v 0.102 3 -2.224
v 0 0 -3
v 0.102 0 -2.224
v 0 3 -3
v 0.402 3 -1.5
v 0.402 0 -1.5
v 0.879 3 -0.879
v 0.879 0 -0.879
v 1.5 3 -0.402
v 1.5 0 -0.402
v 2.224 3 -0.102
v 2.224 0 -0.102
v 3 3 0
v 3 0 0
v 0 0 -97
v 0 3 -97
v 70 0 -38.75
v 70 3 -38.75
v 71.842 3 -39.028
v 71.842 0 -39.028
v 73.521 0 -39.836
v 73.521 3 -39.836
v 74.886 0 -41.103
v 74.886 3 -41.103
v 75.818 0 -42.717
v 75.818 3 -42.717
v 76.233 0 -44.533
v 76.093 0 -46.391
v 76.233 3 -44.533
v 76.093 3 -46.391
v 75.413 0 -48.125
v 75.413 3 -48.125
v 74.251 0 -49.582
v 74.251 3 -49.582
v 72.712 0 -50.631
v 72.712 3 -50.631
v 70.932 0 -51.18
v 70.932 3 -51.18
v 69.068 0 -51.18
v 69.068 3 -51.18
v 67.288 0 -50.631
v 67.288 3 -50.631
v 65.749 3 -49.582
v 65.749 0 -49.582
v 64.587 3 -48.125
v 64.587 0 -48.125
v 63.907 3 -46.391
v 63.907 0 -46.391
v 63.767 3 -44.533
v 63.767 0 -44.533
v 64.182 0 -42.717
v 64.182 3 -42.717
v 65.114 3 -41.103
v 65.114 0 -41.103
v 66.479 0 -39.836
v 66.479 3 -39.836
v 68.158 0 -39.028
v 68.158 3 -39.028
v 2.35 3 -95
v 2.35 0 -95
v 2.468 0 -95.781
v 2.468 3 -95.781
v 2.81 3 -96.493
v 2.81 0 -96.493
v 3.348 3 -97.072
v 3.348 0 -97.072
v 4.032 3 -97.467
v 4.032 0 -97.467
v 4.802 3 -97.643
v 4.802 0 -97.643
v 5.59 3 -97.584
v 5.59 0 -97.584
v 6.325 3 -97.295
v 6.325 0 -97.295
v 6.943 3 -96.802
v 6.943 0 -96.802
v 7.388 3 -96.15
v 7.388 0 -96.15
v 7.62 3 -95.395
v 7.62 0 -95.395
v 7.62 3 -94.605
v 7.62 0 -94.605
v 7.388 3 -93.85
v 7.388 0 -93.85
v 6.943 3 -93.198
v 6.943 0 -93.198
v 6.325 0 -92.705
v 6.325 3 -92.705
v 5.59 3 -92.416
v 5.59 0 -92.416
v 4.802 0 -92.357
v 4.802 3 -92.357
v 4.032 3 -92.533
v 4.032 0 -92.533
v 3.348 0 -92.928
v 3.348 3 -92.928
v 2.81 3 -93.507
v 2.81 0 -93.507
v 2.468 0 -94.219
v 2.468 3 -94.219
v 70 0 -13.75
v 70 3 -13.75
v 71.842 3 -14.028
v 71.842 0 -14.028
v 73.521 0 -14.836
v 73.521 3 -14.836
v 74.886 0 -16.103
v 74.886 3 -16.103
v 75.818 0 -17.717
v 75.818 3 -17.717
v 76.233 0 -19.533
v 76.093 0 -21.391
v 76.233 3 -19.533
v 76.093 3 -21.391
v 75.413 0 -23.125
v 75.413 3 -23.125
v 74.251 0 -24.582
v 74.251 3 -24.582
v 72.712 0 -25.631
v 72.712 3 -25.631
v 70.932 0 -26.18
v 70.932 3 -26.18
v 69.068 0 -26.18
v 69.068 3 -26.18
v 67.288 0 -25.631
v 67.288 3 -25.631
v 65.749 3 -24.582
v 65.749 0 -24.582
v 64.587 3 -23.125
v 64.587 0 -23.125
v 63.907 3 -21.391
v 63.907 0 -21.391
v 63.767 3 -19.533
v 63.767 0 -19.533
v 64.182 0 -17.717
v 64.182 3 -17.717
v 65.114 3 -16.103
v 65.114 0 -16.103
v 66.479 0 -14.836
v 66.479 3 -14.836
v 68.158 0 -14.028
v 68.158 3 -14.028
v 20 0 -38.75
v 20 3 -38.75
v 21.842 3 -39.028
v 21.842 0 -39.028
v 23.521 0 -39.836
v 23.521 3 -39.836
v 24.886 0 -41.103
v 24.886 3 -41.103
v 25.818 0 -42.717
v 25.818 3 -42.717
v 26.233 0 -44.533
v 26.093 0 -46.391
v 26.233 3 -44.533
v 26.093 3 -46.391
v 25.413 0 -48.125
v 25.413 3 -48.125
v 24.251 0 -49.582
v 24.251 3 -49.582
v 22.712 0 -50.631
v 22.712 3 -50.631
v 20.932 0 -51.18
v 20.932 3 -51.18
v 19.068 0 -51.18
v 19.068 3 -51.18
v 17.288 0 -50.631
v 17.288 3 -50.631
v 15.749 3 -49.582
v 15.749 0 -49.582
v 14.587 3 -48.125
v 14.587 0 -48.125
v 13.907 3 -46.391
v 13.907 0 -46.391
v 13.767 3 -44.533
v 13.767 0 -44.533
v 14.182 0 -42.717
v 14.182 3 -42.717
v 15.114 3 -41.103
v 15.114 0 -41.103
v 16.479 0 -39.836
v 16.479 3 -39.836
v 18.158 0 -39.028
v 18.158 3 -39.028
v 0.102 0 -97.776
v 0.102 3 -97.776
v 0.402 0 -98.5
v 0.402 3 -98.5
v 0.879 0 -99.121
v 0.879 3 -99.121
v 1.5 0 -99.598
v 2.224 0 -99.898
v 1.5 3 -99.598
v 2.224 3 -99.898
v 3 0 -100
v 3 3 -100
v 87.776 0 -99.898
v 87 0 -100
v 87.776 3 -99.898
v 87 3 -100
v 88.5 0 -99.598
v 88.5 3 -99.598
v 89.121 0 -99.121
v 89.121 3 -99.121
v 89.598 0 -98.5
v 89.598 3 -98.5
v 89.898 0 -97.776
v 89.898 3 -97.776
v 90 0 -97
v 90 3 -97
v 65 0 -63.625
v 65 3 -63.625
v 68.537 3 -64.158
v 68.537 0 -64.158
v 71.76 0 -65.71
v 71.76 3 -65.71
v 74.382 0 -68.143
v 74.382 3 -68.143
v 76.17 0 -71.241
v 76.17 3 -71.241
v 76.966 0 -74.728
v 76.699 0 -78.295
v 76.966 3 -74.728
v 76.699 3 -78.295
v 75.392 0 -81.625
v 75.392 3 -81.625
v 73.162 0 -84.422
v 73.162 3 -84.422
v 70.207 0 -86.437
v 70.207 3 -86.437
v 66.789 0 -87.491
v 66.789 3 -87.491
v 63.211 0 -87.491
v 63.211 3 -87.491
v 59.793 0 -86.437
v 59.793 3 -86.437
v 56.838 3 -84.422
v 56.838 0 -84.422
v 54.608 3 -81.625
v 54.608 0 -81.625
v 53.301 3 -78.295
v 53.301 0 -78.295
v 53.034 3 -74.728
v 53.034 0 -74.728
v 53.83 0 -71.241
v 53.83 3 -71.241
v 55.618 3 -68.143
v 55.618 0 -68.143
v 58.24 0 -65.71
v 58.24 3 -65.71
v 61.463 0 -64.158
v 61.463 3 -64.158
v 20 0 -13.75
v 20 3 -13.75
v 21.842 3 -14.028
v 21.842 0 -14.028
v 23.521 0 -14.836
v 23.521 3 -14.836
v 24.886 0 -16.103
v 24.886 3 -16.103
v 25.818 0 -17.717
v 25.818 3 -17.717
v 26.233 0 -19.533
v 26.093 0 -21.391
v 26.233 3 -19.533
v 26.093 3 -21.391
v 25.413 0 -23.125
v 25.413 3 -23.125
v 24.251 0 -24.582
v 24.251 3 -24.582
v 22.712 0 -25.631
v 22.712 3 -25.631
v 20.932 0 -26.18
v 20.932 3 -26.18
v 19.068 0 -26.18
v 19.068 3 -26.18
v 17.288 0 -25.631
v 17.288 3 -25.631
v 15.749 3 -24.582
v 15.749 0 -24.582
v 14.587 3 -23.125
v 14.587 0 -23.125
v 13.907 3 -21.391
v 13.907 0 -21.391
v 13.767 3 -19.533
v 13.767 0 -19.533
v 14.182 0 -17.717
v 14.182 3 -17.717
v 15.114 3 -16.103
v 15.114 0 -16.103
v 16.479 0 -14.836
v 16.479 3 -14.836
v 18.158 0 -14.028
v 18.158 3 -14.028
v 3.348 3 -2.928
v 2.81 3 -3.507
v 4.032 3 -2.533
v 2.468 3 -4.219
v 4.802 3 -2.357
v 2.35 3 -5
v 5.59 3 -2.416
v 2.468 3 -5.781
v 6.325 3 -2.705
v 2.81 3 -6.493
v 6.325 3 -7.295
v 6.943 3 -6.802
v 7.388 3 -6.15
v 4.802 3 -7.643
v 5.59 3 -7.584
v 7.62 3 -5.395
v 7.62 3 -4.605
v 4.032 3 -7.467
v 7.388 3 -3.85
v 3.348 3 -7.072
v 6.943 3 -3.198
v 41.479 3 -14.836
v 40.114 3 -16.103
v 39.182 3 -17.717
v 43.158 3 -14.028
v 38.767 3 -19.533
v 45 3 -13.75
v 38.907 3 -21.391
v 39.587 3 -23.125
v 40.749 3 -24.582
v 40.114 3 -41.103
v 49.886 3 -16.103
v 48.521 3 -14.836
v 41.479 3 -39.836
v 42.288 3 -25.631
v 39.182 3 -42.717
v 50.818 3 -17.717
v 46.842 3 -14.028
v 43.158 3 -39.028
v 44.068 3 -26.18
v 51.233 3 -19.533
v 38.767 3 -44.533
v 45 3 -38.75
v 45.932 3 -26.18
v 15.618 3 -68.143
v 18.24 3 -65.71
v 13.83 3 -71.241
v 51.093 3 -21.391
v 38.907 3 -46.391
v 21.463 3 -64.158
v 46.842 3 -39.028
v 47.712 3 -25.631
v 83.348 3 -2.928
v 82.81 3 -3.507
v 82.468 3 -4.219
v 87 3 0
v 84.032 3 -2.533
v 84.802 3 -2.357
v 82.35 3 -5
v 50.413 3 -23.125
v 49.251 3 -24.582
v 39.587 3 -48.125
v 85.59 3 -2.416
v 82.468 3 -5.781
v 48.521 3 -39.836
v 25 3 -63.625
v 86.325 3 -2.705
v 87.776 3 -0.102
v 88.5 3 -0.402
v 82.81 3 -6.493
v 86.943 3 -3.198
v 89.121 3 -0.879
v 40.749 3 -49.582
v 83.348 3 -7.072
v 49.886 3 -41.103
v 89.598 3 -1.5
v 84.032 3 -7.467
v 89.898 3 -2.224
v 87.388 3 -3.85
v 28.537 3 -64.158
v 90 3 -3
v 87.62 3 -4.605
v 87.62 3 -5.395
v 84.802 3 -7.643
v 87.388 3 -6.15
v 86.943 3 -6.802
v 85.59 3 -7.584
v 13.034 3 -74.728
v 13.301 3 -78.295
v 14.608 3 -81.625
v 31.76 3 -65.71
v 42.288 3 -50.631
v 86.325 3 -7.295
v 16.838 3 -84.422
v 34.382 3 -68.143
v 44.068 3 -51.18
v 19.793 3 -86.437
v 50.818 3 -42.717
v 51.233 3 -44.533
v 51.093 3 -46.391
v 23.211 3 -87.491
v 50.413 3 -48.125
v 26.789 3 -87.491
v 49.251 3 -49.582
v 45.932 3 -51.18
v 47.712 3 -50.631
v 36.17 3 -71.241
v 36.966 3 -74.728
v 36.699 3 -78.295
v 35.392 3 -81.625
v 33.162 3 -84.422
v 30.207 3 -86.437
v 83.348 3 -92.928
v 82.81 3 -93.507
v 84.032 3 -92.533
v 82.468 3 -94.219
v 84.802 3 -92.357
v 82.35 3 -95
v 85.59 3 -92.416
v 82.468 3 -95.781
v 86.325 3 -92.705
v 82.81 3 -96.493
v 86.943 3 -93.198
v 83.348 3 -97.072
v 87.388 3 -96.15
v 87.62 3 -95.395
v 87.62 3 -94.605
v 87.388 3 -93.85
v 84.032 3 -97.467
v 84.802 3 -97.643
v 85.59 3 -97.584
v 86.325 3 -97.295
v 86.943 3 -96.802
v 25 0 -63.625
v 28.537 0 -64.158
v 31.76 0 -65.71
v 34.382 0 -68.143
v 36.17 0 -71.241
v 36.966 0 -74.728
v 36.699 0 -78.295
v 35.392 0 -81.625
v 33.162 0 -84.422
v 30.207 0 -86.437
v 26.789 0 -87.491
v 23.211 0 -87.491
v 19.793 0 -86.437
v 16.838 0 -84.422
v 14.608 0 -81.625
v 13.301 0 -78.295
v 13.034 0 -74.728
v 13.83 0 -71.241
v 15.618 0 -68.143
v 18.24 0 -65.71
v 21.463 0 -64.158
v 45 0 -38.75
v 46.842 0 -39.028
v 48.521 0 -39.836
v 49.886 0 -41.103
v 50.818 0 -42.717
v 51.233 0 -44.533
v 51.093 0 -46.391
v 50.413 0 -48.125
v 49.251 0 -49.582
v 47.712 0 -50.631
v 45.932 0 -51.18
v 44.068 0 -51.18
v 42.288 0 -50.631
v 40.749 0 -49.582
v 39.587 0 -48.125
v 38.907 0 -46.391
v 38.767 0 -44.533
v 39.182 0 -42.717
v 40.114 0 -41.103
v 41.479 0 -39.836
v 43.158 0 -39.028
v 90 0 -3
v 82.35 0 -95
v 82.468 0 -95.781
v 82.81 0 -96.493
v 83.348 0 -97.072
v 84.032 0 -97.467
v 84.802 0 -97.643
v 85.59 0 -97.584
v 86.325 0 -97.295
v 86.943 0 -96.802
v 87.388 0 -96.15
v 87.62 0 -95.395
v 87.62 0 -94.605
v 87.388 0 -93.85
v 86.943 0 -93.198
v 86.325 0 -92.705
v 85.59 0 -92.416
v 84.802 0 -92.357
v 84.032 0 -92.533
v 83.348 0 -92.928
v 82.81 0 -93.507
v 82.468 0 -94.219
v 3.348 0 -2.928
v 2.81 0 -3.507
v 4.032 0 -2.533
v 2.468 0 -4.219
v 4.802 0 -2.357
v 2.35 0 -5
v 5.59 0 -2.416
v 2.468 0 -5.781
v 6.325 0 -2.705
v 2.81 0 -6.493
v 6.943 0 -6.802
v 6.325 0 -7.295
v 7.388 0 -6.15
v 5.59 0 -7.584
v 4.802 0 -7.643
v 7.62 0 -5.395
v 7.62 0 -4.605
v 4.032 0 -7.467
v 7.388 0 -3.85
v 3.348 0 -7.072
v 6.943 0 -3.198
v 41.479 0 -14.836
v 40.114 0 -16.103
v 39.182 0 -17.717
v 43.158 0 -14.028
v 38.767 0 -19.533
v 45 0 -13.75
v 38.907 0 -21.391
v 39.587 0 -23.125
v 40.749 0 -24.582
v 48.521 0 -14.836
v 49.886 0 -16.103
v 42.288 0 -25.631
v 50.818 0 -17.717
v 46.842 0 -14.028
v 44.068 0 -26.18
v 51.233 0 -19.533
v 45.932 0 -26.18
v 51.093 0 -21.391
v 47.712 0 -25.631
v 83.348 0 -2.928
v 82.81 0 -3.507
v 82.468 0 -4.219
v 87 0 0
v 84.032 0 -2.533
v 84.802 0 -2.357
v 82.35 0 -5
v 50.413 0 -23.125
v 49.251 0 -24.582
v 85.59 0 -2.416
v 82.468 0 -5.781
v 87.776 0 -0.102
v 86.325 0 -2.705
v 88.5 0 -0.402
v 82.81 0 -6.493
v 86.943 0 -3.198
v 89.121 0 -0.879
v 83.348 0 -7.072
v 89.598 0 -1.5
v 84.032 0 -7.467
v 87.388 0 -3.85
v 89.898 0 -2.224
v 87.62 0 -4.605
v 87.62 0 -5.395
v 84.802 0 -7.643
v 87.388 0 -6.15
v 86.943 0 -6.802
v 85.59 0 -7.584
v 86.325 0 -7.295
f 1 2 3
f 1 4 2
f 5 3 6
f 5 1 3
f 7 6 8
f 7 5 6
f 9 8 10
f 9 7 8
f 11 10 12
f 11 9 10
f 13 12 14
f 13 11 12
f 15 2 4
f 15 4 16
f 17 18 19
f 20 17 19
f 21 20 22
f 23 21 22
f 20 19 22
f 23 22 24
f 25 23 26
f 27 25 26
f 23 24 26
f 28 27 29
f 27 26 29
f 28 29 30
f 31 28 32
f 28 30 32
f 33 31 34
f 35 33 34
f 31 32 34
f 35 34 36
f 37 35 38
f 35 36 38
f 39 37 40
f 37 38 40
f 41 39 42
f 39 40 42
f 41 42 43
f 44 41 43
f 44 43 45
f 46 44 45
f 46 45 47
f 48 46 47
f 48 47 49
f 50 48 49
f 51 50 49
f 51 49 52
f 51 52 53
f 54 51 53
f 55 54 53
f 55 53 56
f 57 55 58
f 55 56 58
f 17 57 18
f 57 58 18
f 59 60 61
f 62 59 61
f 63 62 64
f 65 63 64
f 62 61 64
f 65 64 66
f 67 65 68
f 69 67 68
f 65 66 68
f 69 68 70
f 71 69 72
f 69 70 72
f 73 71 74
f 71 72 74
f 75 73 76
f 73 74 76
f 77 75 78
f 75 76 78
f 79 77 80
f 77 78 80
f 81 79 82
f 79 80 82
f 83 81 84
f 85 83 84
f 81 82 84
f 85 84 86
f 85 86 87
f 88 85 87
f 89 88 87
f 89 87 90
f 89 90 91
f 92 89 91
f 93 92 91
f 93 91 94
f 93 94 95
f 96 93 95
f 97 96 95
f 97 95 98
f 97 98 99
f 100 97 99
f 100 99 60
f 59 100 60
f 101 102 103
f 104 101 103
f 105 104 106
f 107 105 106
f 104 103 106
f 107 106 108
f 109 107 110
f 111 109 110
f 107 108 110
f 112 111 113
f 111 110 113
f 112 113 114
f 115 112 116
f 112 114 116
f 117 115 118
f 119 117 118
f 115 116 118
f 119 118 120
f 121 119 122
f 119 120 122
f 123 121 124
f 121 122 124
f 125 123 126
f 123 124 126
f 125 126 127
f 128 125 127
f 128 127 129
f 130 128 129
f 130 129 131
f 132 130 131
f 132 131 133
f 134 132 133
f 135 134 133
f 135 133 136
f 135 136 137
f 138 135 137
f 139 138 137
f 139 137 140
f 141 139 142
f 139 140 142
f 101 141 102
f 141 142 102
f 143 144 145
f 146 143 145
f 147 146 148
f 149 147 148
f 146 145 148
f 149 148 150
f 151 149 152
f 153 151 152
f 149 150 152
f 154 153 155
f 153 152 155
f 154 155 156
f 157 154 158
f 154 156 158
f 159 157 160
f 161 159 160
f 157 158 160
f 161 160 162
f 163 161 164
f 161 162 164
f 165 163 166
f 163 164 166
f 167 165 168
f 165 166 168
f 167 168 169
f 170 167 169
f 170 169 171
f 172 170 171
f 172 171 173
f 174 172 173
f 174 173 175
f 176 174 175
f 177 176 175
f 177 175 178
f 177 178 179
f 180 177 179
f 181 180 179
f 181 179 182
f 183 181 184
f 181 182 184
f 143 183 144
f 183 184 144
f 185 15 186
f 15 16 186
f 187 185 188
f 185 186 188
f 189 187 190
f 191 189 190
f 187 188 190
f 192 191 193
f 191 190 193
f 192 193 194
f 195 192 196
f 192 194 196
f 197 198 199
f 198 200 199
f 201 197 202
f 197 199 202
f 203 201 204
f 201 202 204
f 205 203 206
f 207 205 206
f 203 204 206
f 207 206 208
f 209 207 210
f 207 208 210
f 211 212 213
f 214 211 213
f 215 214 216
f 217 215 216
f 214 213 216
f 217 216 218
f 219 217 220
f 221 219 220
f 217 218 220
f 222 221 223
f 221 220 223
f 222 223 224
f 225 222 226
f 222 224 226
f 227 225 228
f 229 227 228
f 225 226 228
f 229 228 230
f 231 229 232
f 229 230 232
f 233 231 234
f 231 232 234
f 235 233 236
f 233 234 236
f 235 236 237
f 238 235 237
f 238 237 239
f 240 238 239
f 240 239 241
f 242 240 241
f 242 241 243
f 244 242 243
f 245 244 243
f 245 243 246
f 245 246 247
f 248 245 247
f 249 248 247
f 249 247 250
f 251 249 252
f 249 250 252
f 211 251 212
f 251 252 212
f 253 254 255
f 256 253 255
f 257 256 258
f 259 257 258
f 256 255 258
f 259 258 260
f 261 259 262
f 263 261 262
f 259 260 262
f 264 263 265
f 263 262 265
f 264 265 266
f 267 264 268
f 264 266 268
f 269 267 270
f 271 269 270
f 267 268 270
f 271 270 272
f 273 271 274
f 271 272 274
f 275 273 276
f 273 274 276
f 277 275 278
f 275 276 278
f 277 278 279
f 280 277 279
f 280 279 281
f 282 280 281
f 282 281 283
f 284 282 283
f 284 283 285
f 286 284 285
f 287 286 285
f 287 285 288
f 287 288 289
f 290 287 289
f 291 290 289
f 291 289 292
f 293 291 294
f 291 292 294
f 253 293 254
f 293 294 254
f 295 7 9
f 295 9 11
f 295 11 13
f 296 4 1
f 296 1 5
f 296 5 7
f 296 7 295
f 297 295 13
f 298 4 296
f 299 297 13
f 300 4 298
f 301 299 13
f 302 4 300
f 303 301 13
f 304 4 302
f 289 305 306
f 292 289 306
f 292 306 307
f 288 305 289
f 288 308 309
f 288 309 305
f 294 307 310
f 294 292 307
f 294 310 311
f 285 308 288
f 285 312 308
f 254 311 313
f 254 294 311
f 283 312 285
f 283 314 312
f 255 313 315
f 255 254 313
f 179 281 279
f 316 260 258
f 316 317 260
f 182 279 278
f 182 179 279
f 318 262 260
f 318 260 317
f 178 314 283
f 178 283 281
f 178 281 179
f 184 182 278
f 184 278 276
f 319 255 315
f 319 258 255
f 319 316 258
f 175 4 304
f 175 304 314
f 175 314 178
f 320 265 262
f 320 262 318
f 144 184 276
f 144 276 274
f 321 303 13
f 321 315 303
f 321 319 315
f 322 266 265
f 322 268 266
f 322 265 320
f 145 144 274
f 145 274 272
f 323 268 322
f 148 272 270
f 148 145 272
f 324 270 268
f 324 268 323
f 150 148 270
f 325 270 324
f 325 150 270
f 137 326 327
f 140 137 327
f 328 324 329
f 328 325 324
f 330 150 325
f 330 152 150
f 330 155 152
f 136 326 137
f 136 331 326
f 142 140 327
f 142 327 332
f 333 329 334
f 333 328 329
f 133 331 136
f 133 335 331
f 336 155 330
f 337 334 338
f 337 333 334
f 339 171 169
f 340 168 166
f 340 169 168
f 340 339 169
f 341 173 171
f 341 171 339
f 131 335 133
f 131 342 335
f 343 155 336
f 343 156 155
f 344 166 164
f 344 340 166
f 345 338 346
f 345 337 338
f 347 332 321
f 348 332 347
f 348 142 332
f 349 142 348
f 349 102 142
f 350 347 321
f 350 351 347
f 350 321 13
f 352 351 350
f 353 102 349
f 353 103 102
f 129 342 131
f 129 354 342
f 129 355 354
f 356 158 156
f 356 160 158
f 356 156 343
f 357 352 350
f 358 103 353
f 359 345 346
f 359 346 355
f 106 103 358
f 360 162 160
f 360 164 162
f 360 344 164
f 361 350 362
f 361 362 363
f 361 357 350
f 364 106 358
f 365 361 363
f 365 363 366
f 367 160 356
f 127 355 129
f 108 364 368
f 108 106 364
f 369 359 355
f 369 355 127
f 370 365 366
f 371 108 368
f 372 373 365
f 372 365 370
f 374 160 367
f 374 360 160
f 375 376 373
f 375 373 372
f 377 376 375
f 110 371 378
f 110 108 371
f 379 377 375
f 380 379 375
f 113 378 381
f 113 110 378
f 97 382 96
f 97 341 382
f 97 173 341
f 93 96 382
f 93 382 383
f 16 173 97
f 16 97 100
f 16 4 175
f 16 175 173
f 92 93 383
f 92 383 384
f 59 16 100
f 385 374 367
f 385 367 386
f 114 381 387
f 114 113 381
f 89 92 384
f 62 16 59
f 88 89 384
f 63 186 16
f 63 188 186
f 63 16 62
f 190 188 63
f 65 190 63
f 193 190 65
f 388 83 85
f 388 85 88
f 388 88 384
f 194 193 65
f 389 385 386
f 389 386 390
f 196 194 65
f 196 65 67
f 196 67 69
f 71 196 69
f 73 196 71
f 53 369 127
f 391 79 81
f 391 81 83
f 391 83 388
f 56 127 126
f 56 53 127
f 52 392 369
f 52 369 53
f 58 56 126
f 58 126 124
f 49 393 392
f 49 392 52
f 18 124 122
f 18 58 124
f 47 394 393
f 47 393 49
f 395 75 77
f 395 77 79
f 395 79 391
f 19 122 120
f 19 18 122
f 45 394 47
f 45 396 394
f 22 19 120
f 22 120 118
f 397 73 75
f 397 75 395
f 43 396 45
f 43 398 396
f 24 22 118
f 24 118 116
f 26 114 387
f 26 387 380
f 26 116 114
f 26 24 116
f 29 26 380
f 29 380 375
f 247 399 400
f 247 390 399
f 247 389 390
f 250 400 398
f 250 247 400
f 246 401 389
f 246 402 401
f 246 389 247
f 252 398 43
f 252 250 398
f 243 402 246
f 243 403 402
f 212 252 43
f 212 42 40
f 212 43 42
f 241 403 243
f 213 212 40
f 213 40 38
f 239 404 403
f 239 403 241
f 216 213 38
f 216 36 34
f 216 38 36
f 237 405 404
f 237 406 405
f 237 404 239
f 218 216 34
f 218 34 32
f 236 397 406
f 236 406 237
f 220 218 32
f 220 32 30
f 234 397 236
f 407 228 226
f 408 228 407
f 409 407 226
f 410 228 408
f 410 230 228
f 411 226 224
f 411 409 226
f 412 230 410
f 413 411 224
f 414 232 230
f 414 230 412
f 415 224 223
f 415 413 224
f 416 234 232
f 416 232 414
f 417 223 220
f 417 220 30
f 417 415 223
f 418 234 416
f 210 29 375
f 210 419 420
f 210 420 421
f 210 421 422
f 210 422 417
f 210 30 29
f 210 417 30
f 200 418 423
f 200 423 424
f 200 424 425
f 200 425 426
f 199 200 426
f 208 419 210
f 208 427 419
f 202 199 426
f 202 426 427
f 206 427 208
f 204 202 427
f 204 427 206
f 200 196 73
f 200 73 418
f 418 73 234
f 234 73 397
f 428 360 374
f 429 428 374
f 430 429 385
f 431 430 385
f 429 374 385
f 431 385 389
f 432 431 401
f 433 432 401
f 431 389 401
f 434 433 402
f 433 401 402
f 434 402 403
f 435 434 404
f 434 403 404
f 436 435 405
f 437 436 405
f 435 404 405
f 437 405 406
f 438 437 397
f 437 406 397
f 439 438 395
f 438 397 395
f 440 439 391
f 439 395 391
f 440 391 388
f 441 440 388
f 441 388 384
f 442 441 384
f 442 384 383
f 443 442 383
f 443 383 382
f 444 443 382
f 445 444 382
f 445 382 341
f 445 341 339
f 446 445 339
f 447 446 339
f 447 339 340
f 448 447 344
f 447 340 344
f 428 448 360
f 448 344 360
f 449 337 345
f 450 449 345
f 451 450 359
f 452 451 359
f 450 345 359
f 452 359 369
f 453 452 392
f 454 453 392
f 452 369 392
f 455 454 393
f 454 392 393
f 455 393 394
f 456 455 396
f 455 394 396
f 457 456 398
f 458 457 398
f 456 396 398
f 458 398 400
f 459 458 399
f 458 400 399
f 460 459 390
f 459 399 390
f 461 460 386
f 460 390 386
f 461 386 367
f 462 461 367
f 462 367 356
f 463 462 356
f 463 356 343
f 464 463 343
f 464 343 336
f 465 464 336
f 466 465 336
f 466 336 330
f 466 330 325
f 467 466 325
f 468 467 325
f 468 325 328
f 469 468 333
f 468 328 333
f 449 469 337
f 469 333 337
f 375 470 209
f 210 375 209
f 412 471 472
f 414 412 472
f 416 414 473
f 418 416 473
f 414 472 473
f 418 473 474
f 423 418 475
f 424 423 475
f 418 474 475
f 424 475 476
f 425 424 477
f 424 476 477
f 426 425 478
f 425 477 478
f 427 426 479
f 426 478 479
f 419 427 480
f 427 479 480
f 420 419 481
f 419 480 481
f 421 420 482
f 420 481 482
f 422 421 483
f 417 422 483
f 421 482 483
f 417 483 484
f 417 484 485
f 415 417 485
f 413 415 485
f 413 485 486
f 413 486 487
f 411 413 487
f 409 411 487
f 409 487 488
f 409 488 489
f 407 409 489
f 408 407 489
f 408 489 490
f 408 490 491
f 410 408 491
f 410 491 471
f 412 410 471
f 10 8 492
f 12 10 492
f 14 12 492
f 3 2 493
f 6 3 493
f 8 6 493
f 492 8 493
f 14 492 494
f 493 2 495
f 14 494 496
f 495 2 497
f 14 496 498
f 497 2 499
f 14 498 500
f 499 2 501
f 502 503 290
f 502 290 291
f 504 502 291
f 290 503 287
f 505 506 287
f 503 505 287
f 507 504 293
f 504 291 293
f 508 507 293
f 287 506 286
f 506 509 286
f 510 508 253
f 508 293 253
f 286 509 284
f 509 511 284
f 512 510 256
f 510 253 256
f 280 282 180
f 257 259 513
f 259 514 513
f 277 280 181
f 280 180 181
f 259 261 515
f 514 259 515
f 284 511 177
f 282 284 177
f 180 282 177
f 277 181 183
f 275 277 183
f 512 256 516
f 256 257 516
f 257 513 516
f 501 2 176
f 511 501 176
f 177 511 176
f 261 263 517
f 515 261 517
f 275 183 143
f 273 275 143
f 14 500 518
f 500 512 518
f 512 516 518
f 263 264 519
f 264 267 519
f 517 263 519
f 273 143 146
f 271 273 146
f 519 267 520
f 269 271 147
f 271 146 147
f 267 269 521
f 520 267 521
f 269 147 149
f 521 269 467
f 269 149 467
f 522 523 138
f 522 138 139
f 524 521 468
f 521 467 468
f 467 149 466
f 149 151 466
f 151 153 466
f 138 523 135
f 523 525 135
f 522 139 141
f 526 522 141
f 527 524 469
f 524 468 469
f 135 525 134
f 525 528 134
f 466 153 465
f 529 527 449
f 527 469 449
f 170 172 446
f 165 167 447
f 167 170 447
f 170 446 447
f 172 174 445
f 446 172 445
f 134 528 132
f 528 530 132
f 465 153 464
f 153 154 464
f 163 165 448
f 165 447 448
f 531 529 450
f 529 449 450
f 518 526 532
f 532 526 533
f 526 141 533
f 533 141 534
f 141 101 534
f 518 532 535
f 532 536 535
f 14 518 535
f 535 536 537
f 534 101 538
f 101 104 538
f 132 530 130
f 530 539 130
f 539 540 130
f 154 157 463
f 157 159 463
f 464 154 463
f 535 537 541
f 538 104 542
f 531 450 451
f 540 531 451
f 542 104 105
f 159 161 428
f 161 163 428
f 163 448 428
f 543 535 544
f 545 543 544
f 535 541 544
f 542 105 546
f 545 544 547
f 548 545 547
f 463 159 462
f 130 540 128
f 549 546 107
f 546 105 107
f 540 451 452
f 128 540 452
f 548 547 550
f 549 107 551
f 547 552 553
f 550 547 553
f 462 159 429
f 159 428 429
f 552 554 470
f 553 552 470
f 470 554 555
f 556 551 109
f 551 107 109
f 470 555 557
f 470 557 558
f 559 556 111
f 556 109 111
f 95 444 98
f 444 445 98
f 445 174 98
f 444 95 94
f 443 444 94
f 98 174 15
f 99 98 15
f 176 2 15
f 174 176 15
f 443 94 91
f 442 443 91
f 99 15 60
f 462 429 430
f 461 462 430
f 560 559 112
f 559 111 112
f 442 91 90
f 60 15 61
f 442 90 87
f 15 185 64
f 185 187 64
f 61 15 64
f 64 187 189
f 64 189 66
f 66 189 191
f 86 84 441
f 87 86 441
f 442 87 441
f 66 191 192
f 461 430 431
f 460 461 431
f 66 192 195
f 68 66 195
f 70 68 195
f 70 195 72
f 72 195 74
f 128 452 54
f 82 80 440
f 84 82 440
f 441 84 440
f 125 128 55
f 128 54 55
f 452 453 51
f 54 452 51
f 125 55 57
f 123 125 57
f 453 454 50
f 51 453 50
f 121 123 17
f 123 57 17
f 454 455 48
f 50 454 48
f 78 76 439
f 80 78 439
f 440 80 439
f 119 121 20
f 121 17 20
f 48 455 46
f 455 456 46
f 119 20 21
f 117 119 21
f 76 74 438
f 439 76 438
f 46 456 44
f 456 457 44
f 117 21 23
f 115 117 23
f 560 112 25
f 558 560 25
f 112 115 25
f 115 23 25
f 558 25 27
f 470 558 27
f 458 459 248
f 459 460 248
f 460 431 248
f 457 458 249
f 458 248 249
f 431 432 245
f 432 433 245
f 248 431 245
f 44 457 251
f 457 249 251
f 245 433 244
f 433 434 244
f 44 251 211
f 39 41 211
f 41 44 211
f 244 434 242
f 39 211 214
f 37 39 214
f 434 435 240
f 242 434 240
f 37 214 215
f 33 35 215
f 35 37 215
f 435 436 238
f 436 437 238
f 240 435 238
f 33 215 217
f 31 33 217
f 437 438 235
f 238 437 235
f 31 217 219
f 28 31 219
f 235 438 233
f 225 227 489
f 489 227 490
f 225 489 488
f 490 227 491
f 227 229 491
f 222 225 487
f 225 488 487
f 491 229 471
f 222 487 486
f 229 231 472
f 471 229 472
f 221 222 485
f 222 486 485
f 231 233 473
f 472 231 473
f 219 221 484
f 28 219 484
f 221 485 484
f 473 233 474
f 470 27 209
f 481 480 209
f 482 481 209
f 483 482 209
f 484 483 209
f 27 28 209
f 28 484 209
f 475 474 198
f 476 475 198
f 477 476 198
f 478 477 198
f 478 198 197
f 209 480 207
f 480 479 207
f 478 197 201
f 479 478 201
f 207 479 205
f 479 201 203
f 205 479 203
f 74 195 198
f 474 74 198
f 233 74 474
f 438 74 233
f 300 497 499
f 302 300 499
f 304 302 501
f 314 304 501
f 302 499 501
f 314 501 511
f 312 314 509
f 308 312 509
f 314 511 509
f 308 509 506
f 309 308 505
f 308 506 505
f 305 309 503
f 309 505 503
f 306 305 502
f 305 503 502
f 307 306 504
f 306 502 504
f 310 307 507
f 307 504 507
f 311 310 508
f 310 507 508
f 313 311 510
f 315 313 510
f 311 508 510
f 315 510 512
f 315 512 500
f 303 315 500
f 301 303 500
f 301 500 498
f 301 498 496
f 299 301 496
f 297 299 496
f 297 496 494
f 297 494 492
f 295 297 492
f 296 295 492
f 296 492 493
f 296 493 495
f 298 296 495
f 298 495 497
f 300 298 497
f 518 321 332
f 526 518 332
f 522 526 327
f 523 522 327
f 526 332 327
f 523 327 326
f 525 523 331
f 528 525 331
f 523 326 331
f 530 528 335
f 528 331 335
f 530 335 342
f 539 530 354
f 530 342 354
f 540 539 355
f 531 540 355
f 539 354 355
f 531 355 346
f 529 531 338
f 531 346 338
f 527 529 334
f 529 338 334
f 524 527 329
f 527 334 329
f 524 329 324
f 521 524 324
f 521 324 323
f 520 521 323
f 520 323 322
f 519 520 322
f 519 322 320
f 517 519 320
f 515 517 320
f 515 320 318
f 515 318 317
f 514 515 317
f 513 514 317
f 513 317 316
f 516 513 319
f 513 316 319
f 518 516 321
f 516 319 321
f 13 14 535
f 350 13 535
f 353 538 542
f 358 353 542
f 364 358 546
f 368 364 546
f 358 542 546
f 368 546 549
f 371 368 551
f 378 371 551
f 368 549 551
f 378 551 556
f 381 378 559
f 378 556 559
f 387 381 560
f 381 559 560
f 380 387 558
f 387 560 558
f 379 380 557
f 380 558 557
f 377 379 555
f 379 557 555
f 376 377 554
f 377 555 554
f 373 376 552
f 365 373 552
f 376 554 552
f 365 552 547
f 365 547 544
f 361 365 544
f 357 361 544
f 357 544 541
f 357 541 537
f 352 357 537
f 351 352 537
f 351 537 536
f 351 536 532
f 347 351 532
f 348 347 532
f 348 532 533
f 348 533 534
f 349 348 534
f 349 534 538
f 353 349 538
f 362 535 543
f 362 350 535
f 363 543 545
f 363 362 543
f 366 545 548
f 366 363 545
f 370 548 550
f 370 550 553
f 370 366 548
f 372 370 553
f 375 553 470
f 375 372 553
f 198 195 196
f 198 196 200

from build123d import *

# Parameters (mm, degrees)
SKETCH1_W            = 90
SKETCH1_H            = 100
BOSS_EXTRUDE1_DEPTH  = 3
SKETCH2_R            = 6.25
CUT_EXTRUDE1_DEPTH   = 3
LPATTERN1_COUNT      = 3
LPATTERN1_PITCH      = 25
LPATTERN1_COUNT_DIR2 = 2
LPATTERN1_PITCH_DIR2 = 25
SKETCH3_R            = 12
CUT_EXTRUDE2_DEPTH   = 3
M5_CLEARANCE_HOLE1_D = 5.3
FILLET1_R            = 3


with BuildPart() as part:
    # Sketch1 → Boss-Extrude1 (new body)
    with BuildSketch(Plane(origin=(0, 0, 0), x_dir=(1, 0, 0), z_dir=(0, 1, 0))):
        with Locations((45, 50)):
            Rectangle(SKETCH1_W, SKETCH1_H)
    extrude(amount=BOSS_EXTRUDE1_DEPTH)

    # Sketch2 → Cut-Extrude1 (cut)
    with BuildSketch(Plane(origin=(0, 3, 0), x_dir=(1, 0, 0), z_dir=(0, 1, 0))):
        with Locations(Location((20, 20, 0), (0, 0, 270))):
            Circle(SKETCH2_R)
    cut_extrude1 = extrude(amount=-CUT_EXTRUDE1_DEPTH, mode=Mode.SUBTRACT)

    # LPattern1: Cut-Extrude1 3 × 2
    with Locations(*[(i * LPATTERN1_PITCH, 0, -j * LPATTERN1_PITCH_DIR2) for i in range(LPATTERN1_COUNT) for j in range(LPATTERN1_COUNT_DIR2) if (i, j) != (0, 0)]):
        add(cut_extrude1, mode=Mode.SUBTRACT)

    # Sketch3 → Cut-Extrude2 (cut)
    with BuildSketch(Plane(origin=(0, 3, 0), x_dir=(1, 0, 0), z_dir=(0, 1, 0))):
        with Locations(Location((25, 75.625, 0), (0, 0, 270))):
            Circle(SKETCH3_R)
        with Locations(Location((65, 75.625, 0), (0, 0, 270))):
            Circle(SKETCH3_R)
    extrude(amount=-CUT_EXTRUDE2_DEPTH, mode=Mode.SUBTRACT)

    # M5 Clearance Hole1 (through all)
    with Locations(Plane(origin=(0, 3, 0), x_dir=(1, 0, 0), z_dir=(0, 1, 0))):
        with Locations((5, 95), (5, 5), (85, 5), (85, 95)):
            Hole(M5_CLEARANCE_HOLE1_D / 2)

    # Fillet1
    fillet1_edges = [part.edges().sort_by_distance(p)[0] for p in [
        (0, 1.5, -100),
        (90, 1.5, -100),
        (90, 1.5, 0),
        (0, 1.5, 0),
    ]]
    fillet(fillet1_edges, radius=FILLET1_R)


solid = part.part
